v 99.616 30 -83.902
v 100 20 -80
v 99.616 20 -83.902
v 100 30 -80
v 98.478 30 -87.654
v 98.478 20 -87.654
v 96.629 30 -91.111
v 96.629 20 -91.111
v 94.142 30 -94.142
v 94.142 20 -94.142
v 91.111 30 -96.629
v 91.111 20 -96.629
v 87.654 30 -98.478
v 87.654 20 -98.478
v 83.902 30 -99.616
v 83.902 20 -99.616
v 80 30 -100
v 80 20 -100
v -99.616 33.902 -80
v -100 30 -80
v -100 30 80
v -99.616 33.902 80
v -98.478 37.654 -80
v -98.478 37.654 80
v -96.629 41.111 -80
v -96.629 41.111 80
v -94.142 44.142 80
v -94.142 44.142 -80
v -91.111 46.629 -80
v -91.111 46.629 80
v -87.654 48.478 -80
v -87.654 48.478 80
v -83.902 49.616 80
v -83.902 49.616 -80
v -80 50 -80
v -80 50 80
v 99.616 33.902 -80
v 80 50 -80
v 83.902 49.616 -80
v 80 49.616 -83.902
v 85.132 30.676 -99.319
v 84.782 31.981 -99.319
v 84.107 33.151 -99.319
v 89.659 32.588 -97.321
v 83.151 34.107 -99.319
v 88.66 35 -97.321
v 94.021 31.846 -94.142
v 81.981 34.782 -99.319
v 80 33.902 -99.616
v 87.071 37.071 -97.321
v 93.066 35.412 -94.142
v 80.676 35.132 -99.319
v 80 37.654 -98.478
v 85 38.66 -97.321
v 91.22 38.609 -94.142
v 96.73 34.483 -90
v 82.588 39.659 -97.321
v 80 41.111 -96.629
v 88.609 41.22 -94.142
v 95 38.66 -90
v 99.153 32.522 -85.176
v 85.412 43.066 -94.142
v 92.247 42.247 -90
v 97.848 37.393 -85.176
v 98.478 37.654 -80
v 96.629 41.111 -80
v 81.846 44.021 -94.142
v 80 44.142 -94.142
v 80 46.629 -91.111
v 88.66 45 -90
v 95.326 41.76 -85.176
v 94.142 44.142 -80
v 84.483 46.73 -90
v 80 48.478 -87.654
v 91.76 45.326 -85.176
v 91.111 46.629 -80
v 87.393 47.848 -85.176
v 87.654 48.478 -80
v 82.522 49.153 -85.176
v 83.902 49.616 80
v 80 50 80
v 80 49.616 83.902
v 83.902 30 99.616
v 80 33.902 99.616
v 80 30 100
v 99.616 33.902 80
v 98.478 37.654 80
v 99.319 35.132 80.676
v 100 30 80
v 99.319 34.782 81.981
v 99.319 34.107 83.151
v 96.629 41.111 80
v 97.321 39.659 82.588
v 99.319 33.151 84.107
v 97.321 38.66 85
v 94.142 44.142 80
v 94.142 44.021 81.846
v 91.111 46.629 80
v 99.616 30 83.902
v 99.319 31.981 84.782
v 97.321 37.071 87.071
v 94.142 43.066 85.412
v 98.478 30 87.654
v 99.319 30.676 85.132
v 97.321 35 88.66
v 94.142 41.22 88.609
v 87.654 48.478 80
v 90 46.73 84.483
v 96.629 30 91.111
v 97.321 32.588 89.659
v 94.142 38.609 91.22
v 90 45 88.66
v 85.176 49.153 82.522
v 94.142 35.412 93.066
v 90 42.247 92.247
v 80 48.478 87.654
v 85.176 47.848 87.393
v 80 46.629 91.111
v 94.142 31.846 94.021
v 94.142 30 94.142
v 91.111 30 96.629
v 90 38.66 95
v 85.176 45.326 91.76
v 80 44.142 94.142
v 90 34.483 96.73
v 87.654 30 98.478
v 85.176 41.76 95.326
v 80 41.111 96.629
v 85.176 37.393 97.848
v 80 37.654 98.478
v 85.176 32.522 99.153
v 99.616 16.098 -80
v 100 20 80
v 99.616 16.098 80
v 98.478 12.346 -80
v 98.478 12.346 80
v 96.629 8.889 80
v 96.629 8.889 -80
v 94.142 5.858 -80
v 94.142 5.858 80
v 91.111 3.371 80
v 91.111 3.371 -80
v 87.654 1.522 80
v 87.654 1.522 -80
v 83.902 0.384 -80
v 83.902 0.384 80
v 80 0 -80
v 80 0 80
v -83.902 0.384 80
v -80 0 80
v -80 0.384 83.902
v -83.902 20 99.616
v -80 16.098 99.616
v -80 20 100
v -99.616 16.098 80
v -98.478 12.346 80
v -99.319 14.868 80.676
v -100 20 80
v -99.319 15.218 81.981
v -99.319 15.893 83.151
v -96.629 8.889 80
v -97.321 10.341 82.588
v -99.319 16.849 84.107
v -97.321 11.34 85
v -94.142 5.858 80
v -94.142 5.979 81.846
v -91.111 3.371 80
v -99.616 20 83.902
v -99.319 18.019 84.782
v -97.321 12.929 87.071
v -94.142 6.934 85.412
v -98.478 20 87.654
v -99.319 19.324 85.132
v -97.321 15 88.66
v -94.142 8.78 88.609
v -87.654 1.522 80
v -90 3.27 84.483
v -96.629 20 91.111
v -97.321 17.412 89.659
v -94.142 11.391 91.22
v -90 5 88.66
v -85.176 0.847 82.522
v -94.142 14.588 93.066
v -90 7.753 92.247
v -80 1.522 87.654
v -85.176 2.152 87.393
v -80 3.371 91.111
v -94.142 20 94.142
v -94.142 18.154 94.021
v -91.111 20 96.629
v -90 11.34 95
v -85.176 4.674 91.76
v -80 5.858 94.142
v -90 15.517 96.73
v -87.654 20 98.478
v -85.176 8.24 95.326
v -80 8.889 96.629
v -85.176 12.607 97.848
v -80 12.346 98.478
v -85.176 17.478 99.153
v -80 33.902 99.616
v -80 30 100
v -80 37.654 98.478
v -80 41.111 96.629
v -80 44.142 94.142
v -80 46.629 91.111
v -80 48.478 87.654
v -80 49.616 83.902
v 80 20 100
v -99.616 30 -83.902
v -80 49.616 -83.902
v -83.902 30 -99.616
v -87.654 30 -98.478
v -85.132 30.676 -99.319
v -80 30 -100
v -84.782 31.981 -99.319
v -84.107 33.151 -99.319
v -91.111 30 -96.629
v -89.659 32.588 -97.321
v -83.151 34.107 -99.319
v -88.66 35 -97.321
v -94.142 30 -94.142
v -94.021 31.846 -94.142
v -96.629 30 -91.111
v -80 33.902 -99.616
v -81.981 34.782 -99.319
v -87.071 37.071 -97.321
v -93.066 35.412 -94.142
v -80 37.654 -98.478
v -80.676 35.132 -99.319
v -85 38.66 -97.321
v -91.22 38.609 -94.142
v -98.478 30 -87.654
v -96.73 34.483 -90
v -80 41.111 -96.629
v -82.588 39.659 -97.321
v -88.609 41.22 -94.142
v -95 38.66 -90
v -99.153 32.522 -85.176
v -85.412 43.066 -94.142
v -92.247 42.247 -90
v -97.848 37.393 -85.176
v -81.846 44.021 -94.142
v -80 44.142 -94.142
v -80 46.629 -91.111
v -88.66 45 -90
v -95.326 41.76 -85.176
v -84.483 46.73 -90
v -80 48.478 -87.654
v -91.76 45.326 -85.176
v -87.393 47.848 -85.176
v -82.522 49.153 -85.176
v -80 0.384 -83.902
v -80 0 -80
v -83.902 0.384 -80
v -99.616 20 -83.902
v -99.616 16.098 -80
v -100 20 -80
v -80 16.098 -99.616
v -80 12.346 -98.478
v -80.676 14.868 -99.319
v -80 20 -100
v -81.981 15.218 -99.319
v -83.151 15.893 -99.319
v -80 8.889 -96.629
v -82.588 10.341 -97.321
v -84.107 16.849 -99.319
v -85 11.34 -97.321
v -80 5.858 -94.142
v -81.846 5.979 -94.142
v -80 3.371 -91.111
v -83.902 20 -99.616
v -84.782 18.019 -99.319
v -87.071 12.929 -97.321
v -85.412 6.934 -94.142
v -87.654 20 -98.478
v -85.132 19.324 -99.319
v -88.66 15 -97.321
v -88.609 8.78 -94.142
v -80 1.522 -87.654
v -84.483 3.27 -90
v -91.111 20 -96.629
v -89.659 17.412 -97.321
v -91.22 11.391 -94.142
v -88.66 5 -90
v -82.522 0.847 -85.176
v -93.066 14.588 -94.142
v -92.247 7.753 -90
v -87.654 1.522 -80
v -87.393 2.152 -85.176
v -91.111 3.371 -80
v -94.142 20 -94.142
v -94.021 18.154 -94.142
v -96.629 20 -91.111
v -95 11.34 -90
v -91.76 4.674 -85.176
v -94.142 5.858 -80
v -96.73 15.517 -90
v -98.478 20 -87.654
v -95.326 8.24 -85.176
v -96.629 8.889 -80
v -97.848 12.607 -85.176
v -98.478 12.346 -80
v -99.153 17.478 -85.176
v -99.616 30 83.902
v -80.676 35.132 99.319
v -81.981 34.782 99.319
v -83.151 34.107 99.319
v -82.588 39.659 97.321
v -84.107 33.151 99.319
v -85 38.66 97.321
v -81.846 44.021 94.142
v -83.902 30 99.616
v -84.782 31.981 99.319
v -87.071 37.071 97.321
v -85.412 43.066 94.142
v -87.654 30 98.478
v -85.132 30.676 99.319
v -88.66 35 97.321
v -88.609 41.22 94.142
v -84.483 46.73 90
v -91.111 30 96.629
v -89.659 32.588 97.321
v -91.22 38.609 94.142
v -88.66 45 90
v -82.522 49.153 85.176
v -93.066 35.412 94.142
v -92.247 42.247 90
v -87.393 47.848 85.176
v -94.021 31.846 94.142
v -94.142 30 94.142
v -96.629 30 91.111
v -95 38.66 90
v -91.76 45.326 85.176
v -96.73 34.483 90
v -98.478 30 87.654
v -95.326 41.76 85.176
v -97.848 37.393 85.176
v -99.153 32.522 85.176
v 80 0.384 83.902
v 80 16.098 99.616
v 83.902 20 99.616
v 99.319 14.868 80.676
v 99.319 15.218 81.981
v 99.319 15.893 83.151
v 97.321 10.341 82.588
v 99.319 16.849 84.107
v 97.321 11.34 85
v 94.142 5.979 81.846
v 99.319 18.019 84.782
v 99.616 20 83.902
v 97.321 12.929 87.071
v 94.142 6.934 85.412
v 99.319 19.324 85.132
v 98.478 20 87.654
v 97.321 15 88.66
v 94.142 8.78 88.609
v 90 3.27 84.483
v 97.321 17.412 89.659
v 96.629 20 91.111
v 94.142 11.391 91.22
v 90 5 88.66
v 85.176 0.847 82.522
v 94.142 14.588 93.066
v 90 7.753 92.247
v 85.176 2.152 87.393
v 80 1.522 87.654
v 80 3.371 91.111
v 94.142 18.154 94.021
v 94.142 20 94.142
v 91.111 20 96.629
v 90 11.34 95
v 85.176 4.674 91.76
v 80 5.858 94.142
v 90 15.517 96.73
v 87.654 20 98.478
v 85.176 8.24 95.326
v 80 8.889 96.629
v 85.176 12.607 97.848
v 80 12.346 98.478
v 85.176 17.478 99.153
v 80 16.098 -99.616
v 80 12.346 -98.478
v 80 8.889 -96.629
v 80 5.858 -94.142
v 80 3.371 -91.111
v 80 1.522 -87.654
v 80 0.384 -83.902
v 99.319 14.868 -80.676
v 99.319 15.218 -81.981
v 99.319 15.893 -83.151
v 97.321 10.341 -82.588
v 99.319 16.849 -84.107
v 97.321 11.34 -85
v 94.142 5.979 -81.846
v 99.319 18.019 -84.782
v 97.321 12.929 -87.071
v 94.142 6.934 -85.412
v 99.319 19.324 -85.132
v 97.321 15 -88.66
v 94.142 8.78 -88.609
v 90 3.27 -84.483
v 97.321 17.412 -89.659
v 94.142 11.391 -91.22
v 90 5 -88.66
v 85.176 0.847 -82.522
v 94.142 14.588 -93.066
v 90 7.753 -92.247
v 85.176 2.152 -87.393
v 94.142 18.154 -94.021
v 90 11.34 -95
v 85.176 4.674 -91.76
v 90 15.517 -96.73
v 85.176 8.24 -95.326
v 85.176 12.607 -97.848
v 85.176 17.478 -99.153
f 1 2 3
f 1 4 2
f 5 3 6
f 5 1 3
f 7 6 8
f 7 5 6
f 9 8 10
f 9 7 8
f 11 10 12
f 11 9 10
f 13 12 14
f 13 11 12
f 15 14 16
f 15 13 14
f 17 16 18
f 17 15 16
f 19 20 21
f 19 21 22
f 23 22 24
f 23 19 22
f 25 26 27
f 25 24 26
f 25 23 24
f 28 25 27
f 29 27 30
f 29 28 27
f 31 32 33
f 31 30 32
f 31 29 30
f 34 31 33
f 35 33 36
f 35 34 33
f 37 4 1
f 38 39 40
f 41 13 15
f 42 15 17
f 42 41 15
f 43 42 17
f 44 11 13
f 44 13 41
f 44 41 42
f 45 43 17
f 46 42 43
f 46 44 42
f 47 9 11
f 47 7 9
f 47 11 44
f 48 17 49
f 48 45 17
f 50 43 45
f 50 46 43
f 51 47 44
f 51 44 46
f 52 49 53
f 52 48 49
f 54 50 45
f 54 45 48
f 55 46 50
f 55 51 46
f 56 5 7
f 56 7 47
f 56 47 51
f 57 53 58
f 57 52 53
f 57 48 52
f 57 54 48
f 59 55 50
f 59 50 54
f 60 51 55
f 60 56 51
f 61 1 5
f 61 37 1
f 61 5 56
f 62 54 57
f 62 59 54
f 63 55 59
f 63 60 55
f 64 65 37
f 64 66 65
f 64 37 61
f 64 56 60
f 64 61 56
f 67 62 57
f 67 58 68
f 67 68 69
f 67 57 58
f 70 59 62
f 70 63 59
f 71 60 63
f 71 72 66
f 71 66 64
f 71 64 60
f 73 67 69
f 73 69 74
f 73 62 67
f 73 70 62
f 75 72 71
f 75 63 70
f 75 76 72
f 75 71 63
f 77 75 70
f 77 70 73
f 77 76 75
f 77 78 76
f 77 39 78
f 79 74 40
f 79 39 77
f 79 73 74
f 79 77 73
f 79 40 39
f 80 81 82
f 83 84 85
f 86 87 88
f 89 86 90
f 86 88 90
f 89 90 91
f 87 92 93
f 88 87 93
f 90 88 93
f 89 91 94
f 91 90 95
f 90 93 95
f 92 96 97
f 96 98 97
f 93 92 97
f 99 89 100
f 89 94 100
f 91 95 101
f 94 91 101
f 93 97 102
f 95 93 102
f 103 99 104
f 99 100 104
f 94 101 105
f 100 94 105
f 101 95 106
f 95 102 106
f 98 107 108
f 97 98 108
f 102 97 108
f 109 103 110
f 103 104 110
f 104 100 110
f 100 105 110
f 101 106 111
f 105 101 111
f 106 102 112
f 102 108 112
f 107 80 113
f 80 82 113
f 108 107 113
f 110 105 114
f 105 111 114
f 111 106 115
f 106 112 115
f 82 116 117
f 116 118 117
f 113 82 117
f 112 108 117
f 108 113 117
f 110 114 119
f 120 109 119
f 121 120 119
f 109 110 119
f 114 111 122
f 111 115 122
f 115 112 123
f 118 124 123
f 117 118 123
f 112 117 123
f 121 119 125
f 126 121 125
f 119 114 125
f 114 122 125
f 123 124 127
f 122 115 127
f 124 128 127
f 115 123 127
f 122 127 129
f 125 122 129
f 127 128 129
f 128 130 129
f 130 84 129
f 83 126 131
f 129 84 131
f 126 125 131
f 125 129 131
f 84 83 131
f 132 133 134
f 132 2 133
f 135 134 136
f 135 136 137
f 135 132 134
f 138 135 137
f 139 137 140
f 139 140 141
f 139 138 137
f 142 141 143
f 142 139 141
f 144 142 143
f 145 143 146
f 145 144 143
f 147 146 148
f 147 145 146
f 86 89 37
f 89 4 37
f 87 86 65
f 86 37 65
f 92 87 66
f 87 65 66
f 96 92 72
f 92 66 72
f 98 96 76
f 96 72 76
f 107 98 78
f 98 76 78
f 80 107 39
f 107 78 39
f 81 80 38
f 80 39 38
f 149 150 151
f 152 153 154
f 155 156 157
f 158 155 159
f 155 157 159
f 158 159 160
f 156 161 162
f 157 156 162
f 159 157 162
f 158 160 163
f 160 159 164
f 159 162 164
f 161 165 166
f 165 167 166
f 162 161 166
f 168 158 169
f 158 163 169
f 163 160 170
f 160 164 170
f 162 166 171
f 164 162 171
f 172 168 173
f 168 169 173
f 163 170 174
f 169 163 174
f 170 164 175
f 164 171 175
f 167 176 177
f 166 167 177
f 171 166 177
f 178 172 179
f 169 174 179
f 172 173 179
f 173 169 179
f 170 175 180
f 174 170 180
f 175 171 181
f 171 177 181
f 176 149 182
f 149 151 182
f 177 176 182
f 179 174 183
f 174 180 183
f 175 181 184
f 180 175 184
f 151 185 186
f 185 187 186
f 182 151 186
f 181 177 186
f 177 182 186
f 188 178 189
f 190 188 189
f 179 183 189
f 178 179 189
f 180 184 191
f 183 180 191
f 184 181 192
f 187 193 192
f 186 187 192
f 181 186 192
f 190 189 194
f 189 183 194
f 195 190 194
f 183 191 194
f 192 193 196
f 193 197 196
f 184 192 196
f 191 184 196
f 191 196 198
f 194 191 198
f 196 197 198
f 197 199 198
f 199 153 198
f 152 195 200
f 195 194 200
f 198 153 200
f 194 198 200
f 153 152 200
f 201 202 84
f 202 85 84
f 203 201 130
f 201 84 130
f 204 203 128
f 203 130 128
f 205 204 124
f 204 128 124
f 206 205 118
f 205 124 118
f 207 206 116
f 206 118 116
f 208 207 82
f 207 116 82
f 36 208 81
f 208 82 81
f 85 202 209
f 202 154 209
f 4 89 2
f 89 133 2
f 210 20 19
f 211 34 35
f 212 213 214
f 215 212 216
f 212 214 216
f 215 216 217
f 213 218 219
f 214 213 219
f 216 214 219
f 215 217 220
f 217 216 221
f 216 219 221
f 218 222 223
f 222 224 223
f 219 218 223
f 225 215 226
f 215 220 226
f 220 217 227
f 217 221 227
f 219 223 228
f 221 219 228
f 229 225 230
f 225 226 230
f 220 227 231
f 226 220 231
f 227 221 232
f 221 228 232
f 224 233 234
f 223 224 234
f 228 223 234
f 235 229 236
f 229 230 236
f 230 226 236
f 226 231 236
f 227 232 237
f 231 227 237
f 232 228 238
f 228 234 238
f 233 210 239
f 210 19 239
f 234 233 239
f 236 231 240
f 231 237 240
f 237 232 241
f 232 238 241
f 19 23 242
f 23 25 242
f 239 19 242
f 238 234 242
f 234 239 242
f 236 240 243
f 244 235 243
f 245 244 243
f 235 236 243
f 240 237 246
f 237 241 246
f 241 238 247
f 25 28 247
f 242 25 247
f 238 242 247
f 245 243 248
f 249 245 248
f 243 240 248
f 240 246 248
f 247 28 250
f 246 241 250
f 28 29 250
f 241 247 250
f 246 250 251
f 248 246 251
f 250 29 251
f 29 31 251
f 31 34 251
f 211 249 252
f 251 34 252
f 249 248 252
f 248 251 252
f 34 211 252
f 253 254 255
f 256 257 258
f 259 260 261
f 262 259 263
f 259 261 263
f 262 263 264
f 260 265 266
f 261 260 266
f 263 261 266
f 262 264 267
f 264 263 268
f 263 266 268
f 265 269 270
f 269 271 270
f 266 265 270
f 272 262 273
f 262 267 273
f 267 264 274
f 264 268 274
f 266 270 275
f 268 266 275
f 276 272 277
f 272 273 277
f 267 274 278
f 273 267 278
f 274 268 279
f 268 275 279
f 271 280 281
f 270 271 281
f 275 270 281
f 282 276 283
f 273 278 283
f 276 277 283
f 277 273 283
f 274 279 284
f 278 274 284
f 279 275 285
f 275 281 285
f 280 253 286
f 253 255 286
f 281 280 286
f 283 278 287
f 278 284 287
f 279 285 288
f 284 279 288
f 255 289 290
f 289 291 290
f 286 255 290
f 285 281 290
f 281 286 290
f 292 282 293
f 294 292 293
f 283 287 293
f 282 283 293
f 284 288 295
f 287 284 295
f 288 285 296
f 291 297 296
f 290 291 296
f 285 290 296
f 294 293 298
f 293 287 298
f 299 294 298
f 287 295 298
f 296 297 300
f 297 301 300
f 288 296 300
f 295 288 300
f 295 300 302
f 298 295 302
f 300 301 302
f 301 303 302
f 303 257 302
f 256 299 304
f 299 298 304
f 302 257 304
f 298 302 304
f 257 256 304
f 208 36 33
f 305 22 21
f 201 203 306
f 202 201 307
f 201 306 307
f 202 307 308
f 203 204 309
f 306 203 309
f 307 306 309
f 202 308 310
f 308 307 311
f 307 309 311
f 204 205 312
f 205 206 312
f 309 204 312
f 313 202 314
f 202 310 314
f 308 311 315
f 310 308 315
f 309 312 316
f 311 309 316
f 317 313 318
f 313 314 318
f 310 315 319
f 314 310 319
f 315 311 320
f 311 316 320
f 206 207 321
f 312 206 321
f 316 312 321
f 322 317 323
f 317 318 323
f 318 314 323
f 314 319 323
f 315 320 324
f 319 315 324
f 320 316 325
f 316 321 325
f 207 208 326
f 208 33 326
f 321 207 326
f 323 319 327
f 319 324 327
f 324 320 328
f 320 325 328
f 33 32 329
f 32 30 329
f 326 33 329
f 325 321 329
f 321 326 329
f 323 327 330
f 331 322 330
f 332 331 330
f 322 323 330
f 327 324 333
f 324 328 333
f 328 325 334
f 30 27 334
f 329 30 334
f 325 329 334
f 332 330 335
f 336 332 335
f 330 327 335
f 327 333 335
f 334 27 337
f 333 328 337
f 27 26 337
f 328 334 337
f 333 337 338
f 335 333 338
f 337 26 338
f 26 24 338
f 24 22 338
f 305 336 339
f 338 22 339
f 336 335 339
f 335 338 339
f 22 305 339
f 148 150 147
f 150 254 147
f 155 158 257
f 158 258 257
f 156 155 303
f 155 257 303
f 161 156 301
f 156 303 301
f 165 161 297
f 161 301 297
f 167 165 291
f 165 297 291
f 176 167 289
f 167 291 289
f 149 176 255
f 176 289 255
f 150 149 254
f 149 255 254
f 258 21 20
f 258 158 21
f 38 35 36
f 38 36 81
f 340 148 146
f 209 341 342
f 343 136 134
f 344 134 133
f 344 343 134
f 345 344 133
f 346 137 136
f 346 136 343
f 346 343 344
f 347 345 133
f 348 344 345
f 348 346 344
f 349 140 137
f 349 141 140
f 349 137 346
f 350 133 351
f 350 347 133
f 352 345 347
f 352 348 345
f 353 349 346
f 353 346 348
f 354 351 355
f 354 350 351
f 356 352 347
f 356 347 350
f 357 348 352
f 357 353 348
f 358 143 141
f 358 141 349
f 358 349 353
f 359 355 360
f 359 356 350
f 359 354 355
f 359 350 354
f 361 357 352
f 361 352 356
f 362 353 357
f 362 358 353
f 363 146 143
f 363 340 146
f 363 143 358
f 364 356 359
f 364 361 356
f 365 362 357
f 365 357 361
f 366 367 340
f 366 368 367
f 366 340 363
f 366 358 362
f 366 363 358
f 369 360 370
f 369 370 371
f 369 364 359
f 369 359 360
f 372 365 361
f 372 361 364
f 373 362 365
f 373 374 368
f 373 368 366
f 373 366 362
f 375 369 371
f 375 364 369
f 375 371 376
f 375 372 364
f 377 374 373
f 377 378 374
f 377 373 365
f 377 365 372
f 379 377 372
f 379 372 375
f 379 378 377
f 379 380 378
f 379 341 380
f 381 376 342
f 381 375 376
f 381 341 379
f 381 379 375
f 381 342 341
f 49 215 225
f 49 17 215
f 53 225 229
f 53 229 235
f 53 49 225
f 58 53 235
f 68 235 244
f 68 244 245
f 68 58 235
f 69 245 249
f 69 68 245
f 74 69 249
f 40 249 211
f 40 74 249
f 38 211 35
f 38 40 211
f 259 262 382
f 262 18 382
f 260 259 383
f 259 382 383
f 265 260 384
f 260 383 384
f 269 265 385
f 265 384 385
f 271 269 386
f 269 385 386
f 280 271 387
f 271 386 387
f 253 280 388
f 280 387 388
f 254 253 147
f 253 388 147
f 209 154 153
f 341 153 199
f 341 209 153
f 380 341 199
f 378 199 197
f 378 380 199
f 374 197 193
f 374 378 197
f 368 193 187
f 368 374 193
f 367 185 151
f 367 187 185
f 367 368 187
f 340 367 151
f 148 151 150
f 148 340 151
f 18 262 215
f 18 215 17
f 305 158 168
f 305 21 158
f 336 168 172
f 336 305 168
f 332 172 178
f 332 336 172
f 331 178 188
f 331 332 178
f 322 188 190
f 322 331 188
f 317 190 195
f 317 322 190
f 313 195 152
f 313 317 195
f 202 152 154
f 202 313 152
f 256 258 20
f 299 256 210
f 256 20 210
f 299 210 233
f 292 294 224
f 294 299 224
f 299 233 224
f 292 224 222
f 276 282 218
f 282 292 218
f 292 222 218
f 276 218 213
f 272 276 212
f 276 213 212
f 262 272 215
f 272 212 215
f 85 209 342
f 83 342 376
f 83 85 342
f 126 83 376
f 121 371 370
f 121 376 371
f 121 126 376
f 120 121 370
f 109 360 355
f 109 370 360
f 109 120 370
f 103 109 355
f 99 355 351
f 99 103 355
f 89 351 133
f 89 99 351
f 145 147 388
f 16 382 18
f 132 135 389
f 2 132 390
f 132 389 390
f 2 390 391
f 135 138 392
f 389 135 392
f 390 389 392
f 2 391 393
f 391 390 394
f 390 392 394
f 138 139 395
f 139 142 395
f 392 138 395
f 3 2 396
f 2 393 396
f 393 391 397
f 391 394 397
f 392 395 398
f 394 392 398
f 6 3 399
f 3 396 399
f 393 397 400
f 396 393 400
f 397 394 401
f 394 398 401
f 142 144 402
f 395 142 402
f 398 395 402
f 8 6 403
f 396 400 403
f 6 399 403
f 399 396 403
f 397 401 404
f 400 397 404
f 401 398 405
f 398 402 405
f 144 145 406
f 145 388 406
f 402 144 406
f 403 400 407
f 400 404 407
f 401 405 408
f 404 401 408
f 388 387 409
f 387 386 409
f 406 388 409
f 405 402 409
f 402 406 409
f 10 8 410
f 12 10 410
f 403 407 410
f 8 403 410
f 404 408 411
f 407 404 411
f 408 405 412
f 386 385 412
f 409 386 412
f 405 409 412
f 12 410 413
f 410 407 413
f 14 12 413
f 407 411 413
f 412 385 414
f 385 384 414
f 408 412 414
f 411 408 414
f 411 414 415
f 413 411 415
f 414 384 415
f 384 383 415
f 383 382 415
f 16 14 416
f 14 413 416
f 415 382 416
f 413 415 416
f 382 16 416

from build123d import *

# Parameters (mm, degrees)
SKIZZE1_W                       = 200
SKIZZE1_H                       = 200
AUFSATZ_LINEAR_AUSTRAGEN1_DEPTH = 50
VERRUNDUNG1_R                   = 20


with BuildPart() as part:
    # Skizze1 → Aufsatz-Linear austragen1 (new body)
    with BuildSketch(Plane(origin=(0, 0, 0), x_dir=(1, 0, 0), z_dir=(0, 1, 0))):
        Rectangle(SKIZZE1_W, SKIZZE1_H)
    extrude(amount=AUFSATZ_LINEAR_AUSTRAGEN1_DEPTH)

    # Verrundung1
    verrundung1_edges = [part.edges().sort_by_distance(p)[0] for p in [
        (-100, 50, 0),
        (0, 50, 100),
        (100, 50, 0),
        (0, 0, 100),
        (-100, 0, 0),
        (0, 0, -100),
        (100, 0, 0),
        (100, 25, 100),
        (-100, 25, 100),
        (-100, 25, -100),
        (100, 25, -100),
        (0, 50, -100),
    ]]
    fillet(verrundung1_edges, radius=VERRUNDUNG1_R)


solid = part.part
